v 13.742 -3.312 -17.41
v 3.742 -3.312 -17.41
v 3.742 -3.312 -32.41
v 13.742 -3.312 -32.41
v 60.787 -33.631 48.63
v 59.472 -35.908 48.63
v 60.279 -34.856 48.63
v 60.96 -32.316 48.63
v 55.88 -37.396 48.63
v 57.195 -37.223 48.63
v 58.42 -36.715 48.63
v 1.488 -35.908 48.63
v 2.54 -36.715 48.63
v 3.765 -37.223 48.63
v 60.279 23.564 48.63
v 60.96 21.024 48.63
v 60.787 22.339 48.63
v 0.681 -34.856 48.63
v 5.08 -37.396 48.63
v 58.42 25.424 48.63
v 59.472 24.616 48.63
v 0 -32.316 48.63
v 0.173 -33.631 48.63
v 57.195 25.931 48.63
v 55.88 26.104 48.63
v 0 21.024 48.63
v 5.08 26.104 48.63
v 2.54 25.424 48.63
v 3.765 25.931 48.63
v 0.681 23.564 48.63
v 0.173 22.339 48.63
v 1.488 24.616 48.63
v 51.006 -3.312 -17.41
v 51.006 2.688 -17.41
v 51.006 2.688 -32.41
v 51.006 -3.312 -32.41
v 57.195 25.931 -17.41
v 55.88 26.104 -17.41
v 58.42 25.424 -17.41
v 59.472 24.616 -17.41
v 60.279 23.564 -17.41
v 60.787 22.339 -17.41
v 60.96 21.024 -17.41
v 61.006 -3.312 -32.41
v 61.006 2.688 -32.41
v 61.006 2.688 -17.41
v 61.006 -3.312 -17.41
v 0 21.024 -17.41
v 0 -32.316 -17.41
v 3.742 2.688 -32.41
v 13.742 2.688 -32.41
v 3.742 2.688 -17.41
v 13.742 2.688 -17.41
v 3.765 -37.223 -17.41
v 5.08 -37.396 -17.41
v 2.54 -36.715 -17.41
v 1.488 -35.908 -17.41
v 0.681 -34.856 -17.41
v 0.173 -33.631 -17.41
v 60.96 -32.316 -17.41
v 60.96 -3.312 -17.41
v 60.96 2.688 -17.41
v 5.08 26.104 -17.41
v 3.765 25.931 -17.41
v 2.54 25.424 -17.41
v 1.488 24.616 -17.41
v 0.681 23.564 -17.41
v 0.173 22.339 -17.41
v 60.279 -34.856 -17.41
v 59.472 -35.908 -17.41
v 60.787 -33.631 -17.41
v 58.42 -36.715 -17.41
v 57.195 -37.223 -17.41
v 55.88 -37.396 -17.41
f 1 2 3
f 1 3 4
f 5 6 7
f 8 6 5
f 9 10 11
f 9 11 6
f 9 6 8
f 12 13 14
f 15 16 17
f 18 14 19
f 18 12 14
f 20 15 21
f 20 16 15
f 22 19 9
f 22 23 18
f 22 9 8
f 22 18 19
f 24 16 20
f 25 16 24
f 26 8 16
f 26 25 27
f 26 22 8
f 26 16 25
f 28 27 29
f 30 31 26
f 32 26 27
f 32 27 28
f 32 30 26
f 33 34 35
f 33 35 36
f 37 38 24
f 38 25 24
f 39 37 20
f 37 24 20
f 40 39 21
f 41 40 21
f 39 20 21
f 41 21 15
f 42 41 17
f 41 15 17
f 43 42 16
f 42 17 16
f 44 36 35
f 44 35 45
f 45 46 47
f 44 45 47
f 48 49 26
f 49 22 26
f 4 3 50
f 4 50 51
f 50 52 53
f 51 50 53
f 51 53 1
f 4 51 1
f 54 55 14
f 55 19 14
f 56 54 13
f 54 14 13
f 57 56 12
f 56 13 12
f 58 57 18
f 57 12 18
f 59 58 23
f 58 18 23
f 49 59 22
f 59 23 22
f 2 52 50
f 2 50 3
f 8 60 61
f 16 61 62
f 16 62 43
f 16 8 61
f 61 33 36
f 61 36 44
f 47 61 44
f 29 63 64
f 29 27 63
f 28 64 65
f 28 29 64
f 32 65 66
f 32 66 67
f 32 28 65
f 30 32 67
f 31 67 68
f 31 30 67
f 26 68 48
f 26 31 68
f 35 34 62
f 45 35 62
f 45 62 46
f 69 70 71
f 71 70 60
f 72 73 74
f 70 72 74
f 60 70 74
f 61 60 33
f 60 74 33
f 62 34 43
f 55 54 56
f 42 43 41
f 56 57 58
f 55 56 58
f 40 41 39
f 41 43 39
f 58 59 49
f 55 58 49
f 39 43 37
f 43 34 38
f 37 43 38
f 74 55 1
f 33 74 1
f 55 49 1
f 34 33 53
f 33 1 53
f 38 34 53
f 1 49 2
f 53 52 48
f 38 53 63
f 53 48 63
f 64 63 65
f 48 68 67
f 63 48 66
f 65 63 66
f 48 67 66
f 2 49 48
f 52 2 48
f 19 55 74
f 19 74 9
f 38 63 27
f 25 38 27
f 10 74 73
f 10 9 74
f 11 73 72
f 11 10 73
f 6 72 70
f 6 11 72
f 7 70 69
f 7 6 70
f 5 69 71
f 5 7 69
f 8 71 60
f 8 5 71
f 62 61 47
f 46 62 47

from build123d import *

# Parameters (mm, degrees)
F0_W     = 63.5
F0_H     = 66.04
F1_DEPTH = 60.96
F2_R     = 5.08
F3_W     = 10
F3_H     = 6
F4_DEPTH = 15


with BuildPart() as f1:
    # F0 (on Right) → F1 (new body)
    with BuildSketch(Plane.YZ):
        with Locations((-5.645866, 15.610142)):
            Rectangle(F0_W, F0_H)
    extrude(amount=F1_DEPTH)

    # F2
    f2_edges = [f1.edges().sort_by_distance(p)[0] for p in [
        (60.96, -37.395866, 15.610142),
        (60.96, 26.104134, 15.610142),
        (0, -37.395866, 15.610142),
        (0, 26.104134, 15.610142),
    ]]
    fillet(f2_edges, radius=F2_R)

    # F3 (on face) → F4 (join)
    with BuildSketch(Plane(origin=(0, 0, -17.409858), x_dir=(1, 0, 0), z_dir=(0, 0, -1))):
        with Locations((8.742291, 0.311744)):
            Rectangle(F3_W, F3_H)
        with Locations((56.006265, 0.311744)):
            Rectangle(F3_W, F3_H)
    extrude(amount=F4_DEPTH)


solid = f1.part
